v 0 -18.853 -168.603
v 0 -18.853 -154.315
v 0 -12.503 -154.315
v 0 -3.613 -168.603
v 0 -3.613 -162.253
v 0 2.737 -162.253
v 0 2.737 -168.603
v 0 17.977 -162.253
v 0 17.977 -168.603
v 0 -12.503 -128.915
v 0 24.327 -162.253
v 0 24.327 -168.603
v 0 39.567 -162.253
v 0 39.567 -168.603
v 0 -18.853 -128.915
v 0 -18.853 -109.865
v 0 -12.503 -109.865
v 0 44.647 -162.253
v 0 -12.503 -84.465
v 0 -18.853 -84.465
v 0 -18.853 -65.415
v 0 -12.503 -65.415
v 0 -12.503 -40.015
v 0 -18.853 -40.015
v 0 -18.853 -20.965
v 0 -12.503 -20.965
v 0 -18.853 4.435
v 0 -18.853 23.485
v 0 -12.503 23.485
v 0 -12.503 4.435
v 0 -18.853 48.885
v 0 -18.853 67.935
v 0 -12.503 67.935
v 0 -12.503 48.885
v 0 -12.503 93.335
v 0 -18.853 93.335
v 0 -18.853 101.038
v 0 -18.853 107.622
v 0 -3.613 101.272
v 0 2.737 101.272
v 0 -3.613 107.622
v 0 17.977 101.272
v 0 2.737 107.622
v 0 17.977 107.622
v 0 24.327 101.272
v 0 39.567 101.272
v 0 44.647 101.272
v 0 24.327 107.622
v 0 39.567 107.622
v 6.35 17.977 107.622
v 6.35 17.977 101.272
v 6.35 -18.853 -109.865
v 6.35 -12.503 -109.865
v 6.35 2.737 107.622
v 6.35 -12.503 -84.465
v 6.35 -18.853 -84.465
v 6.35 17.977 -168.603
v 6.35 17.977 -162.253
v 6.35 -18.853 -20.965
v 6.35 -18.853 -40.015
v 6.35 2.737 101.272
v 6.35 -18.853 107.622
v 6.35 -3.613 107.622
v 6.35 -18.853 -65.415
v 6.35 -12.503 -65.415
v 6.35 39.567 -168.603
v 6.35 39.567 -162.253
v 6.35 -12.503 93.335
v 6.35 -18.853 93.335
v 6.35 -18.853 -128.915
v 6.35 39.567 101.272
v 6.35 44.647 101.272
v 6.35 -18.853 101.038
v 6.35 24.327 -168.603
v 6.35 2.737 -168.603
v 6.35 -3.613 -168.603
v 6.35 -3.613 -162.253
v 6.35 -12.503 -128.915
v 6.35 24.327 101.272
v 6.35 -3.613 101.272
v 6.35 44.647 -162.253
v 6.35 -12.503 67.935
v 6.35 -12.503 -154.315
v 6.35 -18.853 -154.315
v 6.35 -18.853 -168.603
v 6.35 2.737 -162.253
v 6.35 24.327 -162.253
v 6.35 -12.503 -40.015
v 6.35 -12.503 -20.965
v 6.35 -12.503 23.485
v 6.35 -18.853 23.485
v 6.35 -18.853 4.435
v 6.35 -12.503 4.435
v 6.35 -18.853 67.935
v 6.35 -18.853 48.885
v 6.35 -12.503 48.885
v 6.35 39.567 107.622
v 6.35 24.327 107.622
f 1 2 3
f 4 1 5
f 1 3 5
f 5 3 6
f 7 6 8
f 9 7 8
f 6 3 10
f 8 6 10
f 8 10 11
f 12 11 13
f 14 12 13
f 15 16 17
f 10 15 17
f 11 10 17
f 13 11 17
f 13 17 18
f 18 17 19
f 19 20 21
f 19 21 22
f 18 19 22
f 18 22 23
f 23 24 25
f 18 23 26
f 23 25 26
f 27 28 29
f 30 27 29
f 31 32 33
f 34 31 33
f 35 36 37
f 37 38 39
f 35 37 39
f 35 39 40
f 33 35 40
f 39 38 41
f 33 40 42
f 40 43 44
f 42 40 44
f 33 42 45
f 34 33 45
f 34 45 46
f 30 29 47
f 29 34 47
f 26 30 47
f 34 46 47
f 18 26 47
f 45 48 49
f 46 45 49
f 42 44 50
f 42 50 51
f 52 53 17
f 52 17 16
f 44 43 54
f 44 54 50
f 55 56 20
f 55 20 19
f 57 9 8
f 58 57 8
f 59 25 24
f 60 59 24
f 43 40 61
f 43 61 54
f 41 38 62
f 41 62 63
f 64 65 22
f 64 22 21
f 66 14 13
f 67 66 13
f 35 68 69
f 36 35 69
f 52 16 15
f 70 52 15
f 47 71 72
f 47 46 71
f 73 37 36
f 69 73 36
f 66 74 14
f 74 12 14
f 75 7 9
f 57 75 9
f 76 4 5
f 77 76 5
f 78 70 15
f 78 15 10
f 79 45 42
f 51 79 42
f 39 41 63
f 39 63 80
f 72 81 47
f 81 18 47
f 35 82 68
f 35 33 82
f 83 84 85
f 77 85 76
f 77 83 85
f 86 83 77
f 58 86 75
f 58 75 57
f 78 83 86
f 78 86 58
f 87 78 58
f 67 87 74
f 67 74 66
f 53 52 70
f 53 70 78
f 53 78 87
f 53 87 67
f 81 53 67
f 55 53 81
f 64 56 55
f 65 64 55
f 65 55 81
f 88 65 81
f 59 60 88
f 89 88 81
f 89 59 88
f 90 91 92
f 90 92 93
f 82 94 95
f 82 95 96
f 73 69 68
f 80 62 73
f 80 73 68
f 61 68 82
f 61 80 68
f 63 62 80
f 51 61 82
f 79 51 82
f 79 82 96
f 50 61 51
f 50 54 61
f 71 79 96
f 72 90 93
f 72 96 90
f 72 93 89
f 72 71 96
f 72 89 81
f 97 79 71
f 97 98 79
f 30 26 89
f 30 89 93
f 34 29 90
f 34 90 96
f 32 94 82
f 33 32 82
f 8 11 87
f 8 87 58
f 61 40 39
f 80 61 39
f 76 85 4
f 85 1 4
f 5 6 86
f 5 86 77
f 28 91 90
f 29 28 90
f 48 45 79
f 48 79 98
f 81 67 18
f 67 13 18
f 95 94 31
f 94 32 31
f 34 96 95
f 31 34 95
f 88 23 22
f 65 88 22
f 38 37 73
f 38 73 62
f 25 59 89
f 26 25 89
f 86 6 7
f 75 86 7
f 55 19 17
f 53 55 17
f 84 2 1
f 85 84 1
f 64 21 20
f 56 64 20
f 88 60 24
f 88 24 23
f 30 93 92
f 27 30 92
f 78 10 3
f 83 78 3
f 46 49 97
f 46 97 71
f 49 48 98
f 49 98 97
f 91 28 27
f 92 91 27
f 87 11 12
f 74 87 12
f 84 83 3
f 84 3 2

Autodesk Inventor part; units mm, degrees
ref_plane "YZ Plane" through (0, 0, 0) normal (1, 0, 0) x (0, 1, 0)
ref_plane "XZ Plane" through (0, 0, 0) normal (0, 1, 0) x (-1, 0, 0)
ref_plane "XY Plane" through (0, 0, 0) normal (0, 0, 1) x (1, 0, 0)
sketch "Sketch1" plane through (0, 0, 0) normal (1, 0, 0) x (0, 1, 0)
  line L0 (44.6473, -162.2528) -> (44.6473, 101.2722)
  line L1 (-18.8527, 107.6222) -> (-3.6127, 107.6222)
  line L2 (-3.6127, 107.6222) -> (-3.6127, 101.2722)
  line L3 (-18.8527, 101.0377) -> (-18.8527, 107.6222)
  line L4 (2.7373, 107.6222) -> (17.9773, 107.6222)
  line L5 (17.9773, 107.6222) -> (17.9773, 101.2722)
  line L6 (2.7373, 101.2722) -> (2.7373, 107.6222)
  line L7 (24.3273, 107.6222) -> (39.5673, 107.6222)
  line L8 (39.5673, 107.6222) -> (39.5673, 101.2722)
  line L9 (24.3273, 101.2722) -> (24.3273, 107.6222)
  line L10 (39.5673, 101.2722) -> (44.6473, 101.2722)
  line L11 (24.3273, 101.2722) -> (17.9773, 101.2722)
  line L12 (2.7373, 101.2722) -> (-3.6127, 101.2722)
  line L13 (44.6473, -30.4903) -> (-18.8527, -30.4903) construction
  line L14 (-3.6127, -168.6028) -> (-3.6127, -162.2528)
  line L15 (17.9773, -168.6028) -> (17.9773, -162.2528)
  line L16 (2.7373, -162.2528) -> (2.7373, -168.6028)
  line L17 (39.5673, -168.6028) -> (39.5673, -162.2528)
  line L18 (24.3273, -162.2528) -> (24.3273, -168.6028)
  line L19 (39.5673, -162.2528) -> (44.6473, -162.2528)
  line L20 (24.3273, -162.2528) -> (17.9773, -162.2528)
  line L21 (2.7373, -162.2528) -> (-3.6127, -162.2528)
  line L22 (24.3273, -168.6028) -> (39.5673, -168.6028)
  line L23 (-18.8527, -168.6028) -> (-3.6127, -168.6028)
  line L24 (2.7373, -168.6028) -> (17.9773, -168.6028)
  line L25 (-3.6127, 107.6222) -> (-18.8527, 107.6222)
  line L26 (39.5673, 107.6222) -> (24.3273, 107.6222)
  line L27 (17.9773, 107.6222) -> (2.7373, 107.6222)
  line L28 (-18.8527, -20.9653) -> (-12.5027, -20.9653)
  line L29 (-12.5027, -20.9653) -> (-12.5027, 4.4347)
  line L30 (-12.5027, 4.4347) -> (-18.8527, 4.4347)
  line L31 (-18.8527, 23.4847) -> (-12.5027, 23.4847)
  line L32 (-12.5027, 23.4847) -> (-12.5027, 48.8847)
  line L33 (-12.5027, 48.8847) -> (-18.8527, 48.8847)
  line L34 (-18.8527, 67.9347) -> (-12.5027, 67.9347)
  line L35 (-12.5027, 67.9347) -> (-12.5027, 93.3347)
  line L36 (-12.5027, 93.3347) -> (-18.8527, 93.3347)
  line L37 (-3.6127, -168.6028) -> (-3.6127, -162.2528)
  line L38 (2.7373, -162.2528) -> (-3.6127, -162.2528)
  line L39 (-18.8527, -40.0153) -> (-12.5027, -40.0153)
  line L40 (-12.5027, -40.0153) -> (-12.5027, -65.4153)
  line L41 (-12.5027, -65.4153) -> (-18.8527, -65.4153)
  line L42 (-18.8527, -84.4653) -> (-12.5027, -84.4653)
  line L43 (-12.5027, -84.4653) -> (-12.5027, -109.8653)
  line L44 (-12.5027, -109.8653) -> (-18.8527, -109.8653)
  line L45 (-18.8527, -128.9153) -> (-12.5027, -128.9153)
  line L46 (-12.5027, -128.9153) -> (-12.5027, -154.3153)
  line L47 (-12.5027, -154.3153) -> (-18.8527, -154.3153)
  line L48 (-18.8527, 107.6222) -> (-18.8527, 93.3347)
  line L49 (-18.8527, 67.9347) -> (-18.8527, 48.8847)
  line L50 (-18.8527, 23.4847) -> (-18.8527, 4.4347)
  line L51 (-18.8527, -20.9653) -> (-18.8527, -40.0153)
  line L52 (-18.8527, -65.4153) -> (-18.8527, -84.4653)
  line L53 (-18.8527, -109.8653) -> (-18.8527, -128.9153)
  line L54 (-18.8527, -154.3153) -> (-18.8527, -168.6028)
  point P0 (0, 0)
  dimension "d2" = 15.24
  dimension "d3" = 6.35
  dimension "d4" = 15.24
  dimension "d5" = 6.35
  dimension "d7" = 15.24
  dimension "d8" = 9.525
  dimension "d9" = 19.05
  dimension "d10" = 19.05
  dimension "d12" = 25.4
  dimension "d13" = 25.4
  dimension "d14" = 25.4
  dimension "d16" = 6.35
  dimension "d17" = 6.35
  dimension "d20" = 276.225
extrude "Extrusion1" add sketch "Sketch1" along normal blind 6.35
equation "\"d10\" = d9"
equation "\"d13\" = d12"
equation "\"d14\" = d12"
properties part number "Front_Back" material "UHMW, White"
